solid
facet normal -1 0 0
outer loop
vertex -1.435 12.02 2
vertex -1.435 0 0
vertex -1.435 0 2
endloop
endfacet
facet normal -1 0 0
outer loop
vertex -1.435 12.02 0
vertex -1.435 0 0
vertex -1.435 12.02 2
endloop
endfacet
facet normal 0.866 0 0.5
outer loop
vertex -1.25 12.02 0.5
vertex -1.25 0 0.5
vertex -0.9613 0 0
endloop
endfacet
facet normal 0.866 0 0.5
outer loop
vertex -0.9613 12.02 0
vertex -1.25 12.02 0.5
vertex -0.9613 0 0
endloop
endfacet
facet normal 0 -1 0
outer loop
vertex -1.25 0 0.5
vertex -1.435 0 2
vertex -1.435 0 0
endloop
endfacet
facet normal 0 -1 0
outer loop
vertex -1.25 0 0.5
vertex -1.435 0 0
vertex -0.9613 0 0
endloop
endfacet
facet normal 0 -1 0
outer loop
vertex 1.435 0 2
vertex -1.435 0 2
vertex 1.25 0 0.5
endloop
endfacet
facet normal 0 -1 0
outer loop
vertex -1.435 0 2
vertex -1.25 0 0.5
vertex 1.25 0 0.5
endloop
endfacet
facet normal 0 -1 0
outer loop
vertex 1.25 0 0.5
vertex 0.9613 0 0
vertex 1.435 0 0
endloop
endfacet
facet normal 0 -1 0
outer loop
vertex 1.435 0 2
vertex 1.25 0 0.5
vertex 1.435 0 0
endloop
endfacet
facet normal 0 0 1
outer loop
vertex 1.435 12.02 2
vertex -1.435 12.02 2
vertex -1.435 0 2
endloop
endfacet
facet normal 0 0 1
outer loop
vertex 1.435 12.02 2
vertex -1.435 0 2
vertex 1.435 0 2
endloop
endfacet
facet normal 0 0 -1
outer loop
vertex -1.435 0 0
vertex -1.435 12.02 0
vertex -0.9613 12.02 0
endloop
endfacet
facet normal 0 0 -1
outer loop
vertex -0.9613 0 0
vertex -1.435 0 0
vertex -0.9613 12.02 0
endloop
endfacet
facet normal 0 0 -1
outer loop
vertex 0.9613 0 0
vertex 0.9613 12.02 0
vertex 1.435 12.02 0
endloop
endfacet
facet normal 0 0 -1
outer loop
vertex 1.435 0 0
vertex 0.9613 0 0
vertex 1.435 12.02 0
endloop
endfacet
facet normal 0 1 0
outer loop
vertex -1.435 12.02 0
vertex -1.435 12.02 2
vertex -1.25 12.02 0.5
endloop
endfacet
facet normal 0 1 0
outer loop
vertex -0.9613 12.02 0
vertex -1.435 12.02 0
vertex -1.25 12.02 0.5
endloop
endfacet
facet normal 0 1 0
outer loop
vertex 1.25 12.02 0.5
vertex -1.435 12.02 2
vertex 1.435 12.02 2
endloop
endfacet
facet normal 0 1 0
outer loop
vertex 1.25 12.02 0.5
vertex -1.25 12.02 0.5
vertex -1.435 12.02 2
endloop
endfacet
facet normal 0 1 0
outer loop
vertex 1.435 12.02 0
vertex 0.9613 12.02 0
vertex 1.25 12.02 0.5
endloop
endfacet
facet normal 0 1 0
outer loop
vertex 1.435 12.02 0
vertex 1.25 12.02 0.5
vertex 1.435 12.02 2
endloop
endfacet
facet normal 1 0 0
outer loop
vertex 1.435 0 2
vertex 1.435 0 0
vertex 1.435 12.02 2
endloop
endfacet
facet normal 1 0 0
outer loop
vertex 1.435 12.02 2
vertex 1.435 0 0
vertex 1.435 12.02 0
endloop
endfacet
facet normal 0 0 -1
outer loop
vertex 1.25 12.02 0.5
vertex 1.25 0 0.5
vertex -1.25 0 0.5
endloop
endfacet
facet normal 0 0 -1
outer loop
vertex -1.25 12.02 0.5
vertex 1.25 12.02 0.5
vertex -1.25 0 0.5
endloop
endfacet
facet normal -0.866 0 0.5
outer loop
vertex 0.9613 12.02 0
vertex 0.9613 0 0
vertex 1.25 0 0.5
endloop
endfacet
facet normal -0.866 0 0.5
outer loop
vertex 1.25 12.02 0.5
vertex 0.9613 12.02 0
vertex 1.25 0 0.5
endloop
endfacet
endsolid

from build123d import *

# Parameters (mm, degrees)
SKETCH1_W           = 2.87
SKETCH1_H           = 12.02
BOSS_EXTRUDE1_DEPTH = 2
CUT_EXTRUDE1_REACH  = 14.02


with BuildPart() as part:
    # Sketch1 → Boss-Extrude1 (new body)
    with BuildSketch(Plane.XY):
        with Locations((0, 6.01)):
            Rectangle(SKETCH1_W, SKETCH1_H)
    extrude(amount=BOSS_EXTRUDE1_DEPTH)

    # Sketch2 → Cut-Extrude1 (cut, up to next)
    with BuildSketch(Plane.XZ, mode=Mode.PRIVATE) as cut_extrude1_sk1:
        Polygon((0, -1.665063509), (1.25, 0.5), (-1.25, 0.5), align=None)
    cut_extrude1_tool1 = extrude(cut_extrude1_sk1.sketch, amount=-CUT_EXTRUDE1_REACH, mode=Mode.PRIVATE) & part.part
    add(cut_extrude1_tool1.solids().sort_by_distance((0, 0, -0.221688))[0], mode=Mode.SUBTRACT)


solid = part.part
